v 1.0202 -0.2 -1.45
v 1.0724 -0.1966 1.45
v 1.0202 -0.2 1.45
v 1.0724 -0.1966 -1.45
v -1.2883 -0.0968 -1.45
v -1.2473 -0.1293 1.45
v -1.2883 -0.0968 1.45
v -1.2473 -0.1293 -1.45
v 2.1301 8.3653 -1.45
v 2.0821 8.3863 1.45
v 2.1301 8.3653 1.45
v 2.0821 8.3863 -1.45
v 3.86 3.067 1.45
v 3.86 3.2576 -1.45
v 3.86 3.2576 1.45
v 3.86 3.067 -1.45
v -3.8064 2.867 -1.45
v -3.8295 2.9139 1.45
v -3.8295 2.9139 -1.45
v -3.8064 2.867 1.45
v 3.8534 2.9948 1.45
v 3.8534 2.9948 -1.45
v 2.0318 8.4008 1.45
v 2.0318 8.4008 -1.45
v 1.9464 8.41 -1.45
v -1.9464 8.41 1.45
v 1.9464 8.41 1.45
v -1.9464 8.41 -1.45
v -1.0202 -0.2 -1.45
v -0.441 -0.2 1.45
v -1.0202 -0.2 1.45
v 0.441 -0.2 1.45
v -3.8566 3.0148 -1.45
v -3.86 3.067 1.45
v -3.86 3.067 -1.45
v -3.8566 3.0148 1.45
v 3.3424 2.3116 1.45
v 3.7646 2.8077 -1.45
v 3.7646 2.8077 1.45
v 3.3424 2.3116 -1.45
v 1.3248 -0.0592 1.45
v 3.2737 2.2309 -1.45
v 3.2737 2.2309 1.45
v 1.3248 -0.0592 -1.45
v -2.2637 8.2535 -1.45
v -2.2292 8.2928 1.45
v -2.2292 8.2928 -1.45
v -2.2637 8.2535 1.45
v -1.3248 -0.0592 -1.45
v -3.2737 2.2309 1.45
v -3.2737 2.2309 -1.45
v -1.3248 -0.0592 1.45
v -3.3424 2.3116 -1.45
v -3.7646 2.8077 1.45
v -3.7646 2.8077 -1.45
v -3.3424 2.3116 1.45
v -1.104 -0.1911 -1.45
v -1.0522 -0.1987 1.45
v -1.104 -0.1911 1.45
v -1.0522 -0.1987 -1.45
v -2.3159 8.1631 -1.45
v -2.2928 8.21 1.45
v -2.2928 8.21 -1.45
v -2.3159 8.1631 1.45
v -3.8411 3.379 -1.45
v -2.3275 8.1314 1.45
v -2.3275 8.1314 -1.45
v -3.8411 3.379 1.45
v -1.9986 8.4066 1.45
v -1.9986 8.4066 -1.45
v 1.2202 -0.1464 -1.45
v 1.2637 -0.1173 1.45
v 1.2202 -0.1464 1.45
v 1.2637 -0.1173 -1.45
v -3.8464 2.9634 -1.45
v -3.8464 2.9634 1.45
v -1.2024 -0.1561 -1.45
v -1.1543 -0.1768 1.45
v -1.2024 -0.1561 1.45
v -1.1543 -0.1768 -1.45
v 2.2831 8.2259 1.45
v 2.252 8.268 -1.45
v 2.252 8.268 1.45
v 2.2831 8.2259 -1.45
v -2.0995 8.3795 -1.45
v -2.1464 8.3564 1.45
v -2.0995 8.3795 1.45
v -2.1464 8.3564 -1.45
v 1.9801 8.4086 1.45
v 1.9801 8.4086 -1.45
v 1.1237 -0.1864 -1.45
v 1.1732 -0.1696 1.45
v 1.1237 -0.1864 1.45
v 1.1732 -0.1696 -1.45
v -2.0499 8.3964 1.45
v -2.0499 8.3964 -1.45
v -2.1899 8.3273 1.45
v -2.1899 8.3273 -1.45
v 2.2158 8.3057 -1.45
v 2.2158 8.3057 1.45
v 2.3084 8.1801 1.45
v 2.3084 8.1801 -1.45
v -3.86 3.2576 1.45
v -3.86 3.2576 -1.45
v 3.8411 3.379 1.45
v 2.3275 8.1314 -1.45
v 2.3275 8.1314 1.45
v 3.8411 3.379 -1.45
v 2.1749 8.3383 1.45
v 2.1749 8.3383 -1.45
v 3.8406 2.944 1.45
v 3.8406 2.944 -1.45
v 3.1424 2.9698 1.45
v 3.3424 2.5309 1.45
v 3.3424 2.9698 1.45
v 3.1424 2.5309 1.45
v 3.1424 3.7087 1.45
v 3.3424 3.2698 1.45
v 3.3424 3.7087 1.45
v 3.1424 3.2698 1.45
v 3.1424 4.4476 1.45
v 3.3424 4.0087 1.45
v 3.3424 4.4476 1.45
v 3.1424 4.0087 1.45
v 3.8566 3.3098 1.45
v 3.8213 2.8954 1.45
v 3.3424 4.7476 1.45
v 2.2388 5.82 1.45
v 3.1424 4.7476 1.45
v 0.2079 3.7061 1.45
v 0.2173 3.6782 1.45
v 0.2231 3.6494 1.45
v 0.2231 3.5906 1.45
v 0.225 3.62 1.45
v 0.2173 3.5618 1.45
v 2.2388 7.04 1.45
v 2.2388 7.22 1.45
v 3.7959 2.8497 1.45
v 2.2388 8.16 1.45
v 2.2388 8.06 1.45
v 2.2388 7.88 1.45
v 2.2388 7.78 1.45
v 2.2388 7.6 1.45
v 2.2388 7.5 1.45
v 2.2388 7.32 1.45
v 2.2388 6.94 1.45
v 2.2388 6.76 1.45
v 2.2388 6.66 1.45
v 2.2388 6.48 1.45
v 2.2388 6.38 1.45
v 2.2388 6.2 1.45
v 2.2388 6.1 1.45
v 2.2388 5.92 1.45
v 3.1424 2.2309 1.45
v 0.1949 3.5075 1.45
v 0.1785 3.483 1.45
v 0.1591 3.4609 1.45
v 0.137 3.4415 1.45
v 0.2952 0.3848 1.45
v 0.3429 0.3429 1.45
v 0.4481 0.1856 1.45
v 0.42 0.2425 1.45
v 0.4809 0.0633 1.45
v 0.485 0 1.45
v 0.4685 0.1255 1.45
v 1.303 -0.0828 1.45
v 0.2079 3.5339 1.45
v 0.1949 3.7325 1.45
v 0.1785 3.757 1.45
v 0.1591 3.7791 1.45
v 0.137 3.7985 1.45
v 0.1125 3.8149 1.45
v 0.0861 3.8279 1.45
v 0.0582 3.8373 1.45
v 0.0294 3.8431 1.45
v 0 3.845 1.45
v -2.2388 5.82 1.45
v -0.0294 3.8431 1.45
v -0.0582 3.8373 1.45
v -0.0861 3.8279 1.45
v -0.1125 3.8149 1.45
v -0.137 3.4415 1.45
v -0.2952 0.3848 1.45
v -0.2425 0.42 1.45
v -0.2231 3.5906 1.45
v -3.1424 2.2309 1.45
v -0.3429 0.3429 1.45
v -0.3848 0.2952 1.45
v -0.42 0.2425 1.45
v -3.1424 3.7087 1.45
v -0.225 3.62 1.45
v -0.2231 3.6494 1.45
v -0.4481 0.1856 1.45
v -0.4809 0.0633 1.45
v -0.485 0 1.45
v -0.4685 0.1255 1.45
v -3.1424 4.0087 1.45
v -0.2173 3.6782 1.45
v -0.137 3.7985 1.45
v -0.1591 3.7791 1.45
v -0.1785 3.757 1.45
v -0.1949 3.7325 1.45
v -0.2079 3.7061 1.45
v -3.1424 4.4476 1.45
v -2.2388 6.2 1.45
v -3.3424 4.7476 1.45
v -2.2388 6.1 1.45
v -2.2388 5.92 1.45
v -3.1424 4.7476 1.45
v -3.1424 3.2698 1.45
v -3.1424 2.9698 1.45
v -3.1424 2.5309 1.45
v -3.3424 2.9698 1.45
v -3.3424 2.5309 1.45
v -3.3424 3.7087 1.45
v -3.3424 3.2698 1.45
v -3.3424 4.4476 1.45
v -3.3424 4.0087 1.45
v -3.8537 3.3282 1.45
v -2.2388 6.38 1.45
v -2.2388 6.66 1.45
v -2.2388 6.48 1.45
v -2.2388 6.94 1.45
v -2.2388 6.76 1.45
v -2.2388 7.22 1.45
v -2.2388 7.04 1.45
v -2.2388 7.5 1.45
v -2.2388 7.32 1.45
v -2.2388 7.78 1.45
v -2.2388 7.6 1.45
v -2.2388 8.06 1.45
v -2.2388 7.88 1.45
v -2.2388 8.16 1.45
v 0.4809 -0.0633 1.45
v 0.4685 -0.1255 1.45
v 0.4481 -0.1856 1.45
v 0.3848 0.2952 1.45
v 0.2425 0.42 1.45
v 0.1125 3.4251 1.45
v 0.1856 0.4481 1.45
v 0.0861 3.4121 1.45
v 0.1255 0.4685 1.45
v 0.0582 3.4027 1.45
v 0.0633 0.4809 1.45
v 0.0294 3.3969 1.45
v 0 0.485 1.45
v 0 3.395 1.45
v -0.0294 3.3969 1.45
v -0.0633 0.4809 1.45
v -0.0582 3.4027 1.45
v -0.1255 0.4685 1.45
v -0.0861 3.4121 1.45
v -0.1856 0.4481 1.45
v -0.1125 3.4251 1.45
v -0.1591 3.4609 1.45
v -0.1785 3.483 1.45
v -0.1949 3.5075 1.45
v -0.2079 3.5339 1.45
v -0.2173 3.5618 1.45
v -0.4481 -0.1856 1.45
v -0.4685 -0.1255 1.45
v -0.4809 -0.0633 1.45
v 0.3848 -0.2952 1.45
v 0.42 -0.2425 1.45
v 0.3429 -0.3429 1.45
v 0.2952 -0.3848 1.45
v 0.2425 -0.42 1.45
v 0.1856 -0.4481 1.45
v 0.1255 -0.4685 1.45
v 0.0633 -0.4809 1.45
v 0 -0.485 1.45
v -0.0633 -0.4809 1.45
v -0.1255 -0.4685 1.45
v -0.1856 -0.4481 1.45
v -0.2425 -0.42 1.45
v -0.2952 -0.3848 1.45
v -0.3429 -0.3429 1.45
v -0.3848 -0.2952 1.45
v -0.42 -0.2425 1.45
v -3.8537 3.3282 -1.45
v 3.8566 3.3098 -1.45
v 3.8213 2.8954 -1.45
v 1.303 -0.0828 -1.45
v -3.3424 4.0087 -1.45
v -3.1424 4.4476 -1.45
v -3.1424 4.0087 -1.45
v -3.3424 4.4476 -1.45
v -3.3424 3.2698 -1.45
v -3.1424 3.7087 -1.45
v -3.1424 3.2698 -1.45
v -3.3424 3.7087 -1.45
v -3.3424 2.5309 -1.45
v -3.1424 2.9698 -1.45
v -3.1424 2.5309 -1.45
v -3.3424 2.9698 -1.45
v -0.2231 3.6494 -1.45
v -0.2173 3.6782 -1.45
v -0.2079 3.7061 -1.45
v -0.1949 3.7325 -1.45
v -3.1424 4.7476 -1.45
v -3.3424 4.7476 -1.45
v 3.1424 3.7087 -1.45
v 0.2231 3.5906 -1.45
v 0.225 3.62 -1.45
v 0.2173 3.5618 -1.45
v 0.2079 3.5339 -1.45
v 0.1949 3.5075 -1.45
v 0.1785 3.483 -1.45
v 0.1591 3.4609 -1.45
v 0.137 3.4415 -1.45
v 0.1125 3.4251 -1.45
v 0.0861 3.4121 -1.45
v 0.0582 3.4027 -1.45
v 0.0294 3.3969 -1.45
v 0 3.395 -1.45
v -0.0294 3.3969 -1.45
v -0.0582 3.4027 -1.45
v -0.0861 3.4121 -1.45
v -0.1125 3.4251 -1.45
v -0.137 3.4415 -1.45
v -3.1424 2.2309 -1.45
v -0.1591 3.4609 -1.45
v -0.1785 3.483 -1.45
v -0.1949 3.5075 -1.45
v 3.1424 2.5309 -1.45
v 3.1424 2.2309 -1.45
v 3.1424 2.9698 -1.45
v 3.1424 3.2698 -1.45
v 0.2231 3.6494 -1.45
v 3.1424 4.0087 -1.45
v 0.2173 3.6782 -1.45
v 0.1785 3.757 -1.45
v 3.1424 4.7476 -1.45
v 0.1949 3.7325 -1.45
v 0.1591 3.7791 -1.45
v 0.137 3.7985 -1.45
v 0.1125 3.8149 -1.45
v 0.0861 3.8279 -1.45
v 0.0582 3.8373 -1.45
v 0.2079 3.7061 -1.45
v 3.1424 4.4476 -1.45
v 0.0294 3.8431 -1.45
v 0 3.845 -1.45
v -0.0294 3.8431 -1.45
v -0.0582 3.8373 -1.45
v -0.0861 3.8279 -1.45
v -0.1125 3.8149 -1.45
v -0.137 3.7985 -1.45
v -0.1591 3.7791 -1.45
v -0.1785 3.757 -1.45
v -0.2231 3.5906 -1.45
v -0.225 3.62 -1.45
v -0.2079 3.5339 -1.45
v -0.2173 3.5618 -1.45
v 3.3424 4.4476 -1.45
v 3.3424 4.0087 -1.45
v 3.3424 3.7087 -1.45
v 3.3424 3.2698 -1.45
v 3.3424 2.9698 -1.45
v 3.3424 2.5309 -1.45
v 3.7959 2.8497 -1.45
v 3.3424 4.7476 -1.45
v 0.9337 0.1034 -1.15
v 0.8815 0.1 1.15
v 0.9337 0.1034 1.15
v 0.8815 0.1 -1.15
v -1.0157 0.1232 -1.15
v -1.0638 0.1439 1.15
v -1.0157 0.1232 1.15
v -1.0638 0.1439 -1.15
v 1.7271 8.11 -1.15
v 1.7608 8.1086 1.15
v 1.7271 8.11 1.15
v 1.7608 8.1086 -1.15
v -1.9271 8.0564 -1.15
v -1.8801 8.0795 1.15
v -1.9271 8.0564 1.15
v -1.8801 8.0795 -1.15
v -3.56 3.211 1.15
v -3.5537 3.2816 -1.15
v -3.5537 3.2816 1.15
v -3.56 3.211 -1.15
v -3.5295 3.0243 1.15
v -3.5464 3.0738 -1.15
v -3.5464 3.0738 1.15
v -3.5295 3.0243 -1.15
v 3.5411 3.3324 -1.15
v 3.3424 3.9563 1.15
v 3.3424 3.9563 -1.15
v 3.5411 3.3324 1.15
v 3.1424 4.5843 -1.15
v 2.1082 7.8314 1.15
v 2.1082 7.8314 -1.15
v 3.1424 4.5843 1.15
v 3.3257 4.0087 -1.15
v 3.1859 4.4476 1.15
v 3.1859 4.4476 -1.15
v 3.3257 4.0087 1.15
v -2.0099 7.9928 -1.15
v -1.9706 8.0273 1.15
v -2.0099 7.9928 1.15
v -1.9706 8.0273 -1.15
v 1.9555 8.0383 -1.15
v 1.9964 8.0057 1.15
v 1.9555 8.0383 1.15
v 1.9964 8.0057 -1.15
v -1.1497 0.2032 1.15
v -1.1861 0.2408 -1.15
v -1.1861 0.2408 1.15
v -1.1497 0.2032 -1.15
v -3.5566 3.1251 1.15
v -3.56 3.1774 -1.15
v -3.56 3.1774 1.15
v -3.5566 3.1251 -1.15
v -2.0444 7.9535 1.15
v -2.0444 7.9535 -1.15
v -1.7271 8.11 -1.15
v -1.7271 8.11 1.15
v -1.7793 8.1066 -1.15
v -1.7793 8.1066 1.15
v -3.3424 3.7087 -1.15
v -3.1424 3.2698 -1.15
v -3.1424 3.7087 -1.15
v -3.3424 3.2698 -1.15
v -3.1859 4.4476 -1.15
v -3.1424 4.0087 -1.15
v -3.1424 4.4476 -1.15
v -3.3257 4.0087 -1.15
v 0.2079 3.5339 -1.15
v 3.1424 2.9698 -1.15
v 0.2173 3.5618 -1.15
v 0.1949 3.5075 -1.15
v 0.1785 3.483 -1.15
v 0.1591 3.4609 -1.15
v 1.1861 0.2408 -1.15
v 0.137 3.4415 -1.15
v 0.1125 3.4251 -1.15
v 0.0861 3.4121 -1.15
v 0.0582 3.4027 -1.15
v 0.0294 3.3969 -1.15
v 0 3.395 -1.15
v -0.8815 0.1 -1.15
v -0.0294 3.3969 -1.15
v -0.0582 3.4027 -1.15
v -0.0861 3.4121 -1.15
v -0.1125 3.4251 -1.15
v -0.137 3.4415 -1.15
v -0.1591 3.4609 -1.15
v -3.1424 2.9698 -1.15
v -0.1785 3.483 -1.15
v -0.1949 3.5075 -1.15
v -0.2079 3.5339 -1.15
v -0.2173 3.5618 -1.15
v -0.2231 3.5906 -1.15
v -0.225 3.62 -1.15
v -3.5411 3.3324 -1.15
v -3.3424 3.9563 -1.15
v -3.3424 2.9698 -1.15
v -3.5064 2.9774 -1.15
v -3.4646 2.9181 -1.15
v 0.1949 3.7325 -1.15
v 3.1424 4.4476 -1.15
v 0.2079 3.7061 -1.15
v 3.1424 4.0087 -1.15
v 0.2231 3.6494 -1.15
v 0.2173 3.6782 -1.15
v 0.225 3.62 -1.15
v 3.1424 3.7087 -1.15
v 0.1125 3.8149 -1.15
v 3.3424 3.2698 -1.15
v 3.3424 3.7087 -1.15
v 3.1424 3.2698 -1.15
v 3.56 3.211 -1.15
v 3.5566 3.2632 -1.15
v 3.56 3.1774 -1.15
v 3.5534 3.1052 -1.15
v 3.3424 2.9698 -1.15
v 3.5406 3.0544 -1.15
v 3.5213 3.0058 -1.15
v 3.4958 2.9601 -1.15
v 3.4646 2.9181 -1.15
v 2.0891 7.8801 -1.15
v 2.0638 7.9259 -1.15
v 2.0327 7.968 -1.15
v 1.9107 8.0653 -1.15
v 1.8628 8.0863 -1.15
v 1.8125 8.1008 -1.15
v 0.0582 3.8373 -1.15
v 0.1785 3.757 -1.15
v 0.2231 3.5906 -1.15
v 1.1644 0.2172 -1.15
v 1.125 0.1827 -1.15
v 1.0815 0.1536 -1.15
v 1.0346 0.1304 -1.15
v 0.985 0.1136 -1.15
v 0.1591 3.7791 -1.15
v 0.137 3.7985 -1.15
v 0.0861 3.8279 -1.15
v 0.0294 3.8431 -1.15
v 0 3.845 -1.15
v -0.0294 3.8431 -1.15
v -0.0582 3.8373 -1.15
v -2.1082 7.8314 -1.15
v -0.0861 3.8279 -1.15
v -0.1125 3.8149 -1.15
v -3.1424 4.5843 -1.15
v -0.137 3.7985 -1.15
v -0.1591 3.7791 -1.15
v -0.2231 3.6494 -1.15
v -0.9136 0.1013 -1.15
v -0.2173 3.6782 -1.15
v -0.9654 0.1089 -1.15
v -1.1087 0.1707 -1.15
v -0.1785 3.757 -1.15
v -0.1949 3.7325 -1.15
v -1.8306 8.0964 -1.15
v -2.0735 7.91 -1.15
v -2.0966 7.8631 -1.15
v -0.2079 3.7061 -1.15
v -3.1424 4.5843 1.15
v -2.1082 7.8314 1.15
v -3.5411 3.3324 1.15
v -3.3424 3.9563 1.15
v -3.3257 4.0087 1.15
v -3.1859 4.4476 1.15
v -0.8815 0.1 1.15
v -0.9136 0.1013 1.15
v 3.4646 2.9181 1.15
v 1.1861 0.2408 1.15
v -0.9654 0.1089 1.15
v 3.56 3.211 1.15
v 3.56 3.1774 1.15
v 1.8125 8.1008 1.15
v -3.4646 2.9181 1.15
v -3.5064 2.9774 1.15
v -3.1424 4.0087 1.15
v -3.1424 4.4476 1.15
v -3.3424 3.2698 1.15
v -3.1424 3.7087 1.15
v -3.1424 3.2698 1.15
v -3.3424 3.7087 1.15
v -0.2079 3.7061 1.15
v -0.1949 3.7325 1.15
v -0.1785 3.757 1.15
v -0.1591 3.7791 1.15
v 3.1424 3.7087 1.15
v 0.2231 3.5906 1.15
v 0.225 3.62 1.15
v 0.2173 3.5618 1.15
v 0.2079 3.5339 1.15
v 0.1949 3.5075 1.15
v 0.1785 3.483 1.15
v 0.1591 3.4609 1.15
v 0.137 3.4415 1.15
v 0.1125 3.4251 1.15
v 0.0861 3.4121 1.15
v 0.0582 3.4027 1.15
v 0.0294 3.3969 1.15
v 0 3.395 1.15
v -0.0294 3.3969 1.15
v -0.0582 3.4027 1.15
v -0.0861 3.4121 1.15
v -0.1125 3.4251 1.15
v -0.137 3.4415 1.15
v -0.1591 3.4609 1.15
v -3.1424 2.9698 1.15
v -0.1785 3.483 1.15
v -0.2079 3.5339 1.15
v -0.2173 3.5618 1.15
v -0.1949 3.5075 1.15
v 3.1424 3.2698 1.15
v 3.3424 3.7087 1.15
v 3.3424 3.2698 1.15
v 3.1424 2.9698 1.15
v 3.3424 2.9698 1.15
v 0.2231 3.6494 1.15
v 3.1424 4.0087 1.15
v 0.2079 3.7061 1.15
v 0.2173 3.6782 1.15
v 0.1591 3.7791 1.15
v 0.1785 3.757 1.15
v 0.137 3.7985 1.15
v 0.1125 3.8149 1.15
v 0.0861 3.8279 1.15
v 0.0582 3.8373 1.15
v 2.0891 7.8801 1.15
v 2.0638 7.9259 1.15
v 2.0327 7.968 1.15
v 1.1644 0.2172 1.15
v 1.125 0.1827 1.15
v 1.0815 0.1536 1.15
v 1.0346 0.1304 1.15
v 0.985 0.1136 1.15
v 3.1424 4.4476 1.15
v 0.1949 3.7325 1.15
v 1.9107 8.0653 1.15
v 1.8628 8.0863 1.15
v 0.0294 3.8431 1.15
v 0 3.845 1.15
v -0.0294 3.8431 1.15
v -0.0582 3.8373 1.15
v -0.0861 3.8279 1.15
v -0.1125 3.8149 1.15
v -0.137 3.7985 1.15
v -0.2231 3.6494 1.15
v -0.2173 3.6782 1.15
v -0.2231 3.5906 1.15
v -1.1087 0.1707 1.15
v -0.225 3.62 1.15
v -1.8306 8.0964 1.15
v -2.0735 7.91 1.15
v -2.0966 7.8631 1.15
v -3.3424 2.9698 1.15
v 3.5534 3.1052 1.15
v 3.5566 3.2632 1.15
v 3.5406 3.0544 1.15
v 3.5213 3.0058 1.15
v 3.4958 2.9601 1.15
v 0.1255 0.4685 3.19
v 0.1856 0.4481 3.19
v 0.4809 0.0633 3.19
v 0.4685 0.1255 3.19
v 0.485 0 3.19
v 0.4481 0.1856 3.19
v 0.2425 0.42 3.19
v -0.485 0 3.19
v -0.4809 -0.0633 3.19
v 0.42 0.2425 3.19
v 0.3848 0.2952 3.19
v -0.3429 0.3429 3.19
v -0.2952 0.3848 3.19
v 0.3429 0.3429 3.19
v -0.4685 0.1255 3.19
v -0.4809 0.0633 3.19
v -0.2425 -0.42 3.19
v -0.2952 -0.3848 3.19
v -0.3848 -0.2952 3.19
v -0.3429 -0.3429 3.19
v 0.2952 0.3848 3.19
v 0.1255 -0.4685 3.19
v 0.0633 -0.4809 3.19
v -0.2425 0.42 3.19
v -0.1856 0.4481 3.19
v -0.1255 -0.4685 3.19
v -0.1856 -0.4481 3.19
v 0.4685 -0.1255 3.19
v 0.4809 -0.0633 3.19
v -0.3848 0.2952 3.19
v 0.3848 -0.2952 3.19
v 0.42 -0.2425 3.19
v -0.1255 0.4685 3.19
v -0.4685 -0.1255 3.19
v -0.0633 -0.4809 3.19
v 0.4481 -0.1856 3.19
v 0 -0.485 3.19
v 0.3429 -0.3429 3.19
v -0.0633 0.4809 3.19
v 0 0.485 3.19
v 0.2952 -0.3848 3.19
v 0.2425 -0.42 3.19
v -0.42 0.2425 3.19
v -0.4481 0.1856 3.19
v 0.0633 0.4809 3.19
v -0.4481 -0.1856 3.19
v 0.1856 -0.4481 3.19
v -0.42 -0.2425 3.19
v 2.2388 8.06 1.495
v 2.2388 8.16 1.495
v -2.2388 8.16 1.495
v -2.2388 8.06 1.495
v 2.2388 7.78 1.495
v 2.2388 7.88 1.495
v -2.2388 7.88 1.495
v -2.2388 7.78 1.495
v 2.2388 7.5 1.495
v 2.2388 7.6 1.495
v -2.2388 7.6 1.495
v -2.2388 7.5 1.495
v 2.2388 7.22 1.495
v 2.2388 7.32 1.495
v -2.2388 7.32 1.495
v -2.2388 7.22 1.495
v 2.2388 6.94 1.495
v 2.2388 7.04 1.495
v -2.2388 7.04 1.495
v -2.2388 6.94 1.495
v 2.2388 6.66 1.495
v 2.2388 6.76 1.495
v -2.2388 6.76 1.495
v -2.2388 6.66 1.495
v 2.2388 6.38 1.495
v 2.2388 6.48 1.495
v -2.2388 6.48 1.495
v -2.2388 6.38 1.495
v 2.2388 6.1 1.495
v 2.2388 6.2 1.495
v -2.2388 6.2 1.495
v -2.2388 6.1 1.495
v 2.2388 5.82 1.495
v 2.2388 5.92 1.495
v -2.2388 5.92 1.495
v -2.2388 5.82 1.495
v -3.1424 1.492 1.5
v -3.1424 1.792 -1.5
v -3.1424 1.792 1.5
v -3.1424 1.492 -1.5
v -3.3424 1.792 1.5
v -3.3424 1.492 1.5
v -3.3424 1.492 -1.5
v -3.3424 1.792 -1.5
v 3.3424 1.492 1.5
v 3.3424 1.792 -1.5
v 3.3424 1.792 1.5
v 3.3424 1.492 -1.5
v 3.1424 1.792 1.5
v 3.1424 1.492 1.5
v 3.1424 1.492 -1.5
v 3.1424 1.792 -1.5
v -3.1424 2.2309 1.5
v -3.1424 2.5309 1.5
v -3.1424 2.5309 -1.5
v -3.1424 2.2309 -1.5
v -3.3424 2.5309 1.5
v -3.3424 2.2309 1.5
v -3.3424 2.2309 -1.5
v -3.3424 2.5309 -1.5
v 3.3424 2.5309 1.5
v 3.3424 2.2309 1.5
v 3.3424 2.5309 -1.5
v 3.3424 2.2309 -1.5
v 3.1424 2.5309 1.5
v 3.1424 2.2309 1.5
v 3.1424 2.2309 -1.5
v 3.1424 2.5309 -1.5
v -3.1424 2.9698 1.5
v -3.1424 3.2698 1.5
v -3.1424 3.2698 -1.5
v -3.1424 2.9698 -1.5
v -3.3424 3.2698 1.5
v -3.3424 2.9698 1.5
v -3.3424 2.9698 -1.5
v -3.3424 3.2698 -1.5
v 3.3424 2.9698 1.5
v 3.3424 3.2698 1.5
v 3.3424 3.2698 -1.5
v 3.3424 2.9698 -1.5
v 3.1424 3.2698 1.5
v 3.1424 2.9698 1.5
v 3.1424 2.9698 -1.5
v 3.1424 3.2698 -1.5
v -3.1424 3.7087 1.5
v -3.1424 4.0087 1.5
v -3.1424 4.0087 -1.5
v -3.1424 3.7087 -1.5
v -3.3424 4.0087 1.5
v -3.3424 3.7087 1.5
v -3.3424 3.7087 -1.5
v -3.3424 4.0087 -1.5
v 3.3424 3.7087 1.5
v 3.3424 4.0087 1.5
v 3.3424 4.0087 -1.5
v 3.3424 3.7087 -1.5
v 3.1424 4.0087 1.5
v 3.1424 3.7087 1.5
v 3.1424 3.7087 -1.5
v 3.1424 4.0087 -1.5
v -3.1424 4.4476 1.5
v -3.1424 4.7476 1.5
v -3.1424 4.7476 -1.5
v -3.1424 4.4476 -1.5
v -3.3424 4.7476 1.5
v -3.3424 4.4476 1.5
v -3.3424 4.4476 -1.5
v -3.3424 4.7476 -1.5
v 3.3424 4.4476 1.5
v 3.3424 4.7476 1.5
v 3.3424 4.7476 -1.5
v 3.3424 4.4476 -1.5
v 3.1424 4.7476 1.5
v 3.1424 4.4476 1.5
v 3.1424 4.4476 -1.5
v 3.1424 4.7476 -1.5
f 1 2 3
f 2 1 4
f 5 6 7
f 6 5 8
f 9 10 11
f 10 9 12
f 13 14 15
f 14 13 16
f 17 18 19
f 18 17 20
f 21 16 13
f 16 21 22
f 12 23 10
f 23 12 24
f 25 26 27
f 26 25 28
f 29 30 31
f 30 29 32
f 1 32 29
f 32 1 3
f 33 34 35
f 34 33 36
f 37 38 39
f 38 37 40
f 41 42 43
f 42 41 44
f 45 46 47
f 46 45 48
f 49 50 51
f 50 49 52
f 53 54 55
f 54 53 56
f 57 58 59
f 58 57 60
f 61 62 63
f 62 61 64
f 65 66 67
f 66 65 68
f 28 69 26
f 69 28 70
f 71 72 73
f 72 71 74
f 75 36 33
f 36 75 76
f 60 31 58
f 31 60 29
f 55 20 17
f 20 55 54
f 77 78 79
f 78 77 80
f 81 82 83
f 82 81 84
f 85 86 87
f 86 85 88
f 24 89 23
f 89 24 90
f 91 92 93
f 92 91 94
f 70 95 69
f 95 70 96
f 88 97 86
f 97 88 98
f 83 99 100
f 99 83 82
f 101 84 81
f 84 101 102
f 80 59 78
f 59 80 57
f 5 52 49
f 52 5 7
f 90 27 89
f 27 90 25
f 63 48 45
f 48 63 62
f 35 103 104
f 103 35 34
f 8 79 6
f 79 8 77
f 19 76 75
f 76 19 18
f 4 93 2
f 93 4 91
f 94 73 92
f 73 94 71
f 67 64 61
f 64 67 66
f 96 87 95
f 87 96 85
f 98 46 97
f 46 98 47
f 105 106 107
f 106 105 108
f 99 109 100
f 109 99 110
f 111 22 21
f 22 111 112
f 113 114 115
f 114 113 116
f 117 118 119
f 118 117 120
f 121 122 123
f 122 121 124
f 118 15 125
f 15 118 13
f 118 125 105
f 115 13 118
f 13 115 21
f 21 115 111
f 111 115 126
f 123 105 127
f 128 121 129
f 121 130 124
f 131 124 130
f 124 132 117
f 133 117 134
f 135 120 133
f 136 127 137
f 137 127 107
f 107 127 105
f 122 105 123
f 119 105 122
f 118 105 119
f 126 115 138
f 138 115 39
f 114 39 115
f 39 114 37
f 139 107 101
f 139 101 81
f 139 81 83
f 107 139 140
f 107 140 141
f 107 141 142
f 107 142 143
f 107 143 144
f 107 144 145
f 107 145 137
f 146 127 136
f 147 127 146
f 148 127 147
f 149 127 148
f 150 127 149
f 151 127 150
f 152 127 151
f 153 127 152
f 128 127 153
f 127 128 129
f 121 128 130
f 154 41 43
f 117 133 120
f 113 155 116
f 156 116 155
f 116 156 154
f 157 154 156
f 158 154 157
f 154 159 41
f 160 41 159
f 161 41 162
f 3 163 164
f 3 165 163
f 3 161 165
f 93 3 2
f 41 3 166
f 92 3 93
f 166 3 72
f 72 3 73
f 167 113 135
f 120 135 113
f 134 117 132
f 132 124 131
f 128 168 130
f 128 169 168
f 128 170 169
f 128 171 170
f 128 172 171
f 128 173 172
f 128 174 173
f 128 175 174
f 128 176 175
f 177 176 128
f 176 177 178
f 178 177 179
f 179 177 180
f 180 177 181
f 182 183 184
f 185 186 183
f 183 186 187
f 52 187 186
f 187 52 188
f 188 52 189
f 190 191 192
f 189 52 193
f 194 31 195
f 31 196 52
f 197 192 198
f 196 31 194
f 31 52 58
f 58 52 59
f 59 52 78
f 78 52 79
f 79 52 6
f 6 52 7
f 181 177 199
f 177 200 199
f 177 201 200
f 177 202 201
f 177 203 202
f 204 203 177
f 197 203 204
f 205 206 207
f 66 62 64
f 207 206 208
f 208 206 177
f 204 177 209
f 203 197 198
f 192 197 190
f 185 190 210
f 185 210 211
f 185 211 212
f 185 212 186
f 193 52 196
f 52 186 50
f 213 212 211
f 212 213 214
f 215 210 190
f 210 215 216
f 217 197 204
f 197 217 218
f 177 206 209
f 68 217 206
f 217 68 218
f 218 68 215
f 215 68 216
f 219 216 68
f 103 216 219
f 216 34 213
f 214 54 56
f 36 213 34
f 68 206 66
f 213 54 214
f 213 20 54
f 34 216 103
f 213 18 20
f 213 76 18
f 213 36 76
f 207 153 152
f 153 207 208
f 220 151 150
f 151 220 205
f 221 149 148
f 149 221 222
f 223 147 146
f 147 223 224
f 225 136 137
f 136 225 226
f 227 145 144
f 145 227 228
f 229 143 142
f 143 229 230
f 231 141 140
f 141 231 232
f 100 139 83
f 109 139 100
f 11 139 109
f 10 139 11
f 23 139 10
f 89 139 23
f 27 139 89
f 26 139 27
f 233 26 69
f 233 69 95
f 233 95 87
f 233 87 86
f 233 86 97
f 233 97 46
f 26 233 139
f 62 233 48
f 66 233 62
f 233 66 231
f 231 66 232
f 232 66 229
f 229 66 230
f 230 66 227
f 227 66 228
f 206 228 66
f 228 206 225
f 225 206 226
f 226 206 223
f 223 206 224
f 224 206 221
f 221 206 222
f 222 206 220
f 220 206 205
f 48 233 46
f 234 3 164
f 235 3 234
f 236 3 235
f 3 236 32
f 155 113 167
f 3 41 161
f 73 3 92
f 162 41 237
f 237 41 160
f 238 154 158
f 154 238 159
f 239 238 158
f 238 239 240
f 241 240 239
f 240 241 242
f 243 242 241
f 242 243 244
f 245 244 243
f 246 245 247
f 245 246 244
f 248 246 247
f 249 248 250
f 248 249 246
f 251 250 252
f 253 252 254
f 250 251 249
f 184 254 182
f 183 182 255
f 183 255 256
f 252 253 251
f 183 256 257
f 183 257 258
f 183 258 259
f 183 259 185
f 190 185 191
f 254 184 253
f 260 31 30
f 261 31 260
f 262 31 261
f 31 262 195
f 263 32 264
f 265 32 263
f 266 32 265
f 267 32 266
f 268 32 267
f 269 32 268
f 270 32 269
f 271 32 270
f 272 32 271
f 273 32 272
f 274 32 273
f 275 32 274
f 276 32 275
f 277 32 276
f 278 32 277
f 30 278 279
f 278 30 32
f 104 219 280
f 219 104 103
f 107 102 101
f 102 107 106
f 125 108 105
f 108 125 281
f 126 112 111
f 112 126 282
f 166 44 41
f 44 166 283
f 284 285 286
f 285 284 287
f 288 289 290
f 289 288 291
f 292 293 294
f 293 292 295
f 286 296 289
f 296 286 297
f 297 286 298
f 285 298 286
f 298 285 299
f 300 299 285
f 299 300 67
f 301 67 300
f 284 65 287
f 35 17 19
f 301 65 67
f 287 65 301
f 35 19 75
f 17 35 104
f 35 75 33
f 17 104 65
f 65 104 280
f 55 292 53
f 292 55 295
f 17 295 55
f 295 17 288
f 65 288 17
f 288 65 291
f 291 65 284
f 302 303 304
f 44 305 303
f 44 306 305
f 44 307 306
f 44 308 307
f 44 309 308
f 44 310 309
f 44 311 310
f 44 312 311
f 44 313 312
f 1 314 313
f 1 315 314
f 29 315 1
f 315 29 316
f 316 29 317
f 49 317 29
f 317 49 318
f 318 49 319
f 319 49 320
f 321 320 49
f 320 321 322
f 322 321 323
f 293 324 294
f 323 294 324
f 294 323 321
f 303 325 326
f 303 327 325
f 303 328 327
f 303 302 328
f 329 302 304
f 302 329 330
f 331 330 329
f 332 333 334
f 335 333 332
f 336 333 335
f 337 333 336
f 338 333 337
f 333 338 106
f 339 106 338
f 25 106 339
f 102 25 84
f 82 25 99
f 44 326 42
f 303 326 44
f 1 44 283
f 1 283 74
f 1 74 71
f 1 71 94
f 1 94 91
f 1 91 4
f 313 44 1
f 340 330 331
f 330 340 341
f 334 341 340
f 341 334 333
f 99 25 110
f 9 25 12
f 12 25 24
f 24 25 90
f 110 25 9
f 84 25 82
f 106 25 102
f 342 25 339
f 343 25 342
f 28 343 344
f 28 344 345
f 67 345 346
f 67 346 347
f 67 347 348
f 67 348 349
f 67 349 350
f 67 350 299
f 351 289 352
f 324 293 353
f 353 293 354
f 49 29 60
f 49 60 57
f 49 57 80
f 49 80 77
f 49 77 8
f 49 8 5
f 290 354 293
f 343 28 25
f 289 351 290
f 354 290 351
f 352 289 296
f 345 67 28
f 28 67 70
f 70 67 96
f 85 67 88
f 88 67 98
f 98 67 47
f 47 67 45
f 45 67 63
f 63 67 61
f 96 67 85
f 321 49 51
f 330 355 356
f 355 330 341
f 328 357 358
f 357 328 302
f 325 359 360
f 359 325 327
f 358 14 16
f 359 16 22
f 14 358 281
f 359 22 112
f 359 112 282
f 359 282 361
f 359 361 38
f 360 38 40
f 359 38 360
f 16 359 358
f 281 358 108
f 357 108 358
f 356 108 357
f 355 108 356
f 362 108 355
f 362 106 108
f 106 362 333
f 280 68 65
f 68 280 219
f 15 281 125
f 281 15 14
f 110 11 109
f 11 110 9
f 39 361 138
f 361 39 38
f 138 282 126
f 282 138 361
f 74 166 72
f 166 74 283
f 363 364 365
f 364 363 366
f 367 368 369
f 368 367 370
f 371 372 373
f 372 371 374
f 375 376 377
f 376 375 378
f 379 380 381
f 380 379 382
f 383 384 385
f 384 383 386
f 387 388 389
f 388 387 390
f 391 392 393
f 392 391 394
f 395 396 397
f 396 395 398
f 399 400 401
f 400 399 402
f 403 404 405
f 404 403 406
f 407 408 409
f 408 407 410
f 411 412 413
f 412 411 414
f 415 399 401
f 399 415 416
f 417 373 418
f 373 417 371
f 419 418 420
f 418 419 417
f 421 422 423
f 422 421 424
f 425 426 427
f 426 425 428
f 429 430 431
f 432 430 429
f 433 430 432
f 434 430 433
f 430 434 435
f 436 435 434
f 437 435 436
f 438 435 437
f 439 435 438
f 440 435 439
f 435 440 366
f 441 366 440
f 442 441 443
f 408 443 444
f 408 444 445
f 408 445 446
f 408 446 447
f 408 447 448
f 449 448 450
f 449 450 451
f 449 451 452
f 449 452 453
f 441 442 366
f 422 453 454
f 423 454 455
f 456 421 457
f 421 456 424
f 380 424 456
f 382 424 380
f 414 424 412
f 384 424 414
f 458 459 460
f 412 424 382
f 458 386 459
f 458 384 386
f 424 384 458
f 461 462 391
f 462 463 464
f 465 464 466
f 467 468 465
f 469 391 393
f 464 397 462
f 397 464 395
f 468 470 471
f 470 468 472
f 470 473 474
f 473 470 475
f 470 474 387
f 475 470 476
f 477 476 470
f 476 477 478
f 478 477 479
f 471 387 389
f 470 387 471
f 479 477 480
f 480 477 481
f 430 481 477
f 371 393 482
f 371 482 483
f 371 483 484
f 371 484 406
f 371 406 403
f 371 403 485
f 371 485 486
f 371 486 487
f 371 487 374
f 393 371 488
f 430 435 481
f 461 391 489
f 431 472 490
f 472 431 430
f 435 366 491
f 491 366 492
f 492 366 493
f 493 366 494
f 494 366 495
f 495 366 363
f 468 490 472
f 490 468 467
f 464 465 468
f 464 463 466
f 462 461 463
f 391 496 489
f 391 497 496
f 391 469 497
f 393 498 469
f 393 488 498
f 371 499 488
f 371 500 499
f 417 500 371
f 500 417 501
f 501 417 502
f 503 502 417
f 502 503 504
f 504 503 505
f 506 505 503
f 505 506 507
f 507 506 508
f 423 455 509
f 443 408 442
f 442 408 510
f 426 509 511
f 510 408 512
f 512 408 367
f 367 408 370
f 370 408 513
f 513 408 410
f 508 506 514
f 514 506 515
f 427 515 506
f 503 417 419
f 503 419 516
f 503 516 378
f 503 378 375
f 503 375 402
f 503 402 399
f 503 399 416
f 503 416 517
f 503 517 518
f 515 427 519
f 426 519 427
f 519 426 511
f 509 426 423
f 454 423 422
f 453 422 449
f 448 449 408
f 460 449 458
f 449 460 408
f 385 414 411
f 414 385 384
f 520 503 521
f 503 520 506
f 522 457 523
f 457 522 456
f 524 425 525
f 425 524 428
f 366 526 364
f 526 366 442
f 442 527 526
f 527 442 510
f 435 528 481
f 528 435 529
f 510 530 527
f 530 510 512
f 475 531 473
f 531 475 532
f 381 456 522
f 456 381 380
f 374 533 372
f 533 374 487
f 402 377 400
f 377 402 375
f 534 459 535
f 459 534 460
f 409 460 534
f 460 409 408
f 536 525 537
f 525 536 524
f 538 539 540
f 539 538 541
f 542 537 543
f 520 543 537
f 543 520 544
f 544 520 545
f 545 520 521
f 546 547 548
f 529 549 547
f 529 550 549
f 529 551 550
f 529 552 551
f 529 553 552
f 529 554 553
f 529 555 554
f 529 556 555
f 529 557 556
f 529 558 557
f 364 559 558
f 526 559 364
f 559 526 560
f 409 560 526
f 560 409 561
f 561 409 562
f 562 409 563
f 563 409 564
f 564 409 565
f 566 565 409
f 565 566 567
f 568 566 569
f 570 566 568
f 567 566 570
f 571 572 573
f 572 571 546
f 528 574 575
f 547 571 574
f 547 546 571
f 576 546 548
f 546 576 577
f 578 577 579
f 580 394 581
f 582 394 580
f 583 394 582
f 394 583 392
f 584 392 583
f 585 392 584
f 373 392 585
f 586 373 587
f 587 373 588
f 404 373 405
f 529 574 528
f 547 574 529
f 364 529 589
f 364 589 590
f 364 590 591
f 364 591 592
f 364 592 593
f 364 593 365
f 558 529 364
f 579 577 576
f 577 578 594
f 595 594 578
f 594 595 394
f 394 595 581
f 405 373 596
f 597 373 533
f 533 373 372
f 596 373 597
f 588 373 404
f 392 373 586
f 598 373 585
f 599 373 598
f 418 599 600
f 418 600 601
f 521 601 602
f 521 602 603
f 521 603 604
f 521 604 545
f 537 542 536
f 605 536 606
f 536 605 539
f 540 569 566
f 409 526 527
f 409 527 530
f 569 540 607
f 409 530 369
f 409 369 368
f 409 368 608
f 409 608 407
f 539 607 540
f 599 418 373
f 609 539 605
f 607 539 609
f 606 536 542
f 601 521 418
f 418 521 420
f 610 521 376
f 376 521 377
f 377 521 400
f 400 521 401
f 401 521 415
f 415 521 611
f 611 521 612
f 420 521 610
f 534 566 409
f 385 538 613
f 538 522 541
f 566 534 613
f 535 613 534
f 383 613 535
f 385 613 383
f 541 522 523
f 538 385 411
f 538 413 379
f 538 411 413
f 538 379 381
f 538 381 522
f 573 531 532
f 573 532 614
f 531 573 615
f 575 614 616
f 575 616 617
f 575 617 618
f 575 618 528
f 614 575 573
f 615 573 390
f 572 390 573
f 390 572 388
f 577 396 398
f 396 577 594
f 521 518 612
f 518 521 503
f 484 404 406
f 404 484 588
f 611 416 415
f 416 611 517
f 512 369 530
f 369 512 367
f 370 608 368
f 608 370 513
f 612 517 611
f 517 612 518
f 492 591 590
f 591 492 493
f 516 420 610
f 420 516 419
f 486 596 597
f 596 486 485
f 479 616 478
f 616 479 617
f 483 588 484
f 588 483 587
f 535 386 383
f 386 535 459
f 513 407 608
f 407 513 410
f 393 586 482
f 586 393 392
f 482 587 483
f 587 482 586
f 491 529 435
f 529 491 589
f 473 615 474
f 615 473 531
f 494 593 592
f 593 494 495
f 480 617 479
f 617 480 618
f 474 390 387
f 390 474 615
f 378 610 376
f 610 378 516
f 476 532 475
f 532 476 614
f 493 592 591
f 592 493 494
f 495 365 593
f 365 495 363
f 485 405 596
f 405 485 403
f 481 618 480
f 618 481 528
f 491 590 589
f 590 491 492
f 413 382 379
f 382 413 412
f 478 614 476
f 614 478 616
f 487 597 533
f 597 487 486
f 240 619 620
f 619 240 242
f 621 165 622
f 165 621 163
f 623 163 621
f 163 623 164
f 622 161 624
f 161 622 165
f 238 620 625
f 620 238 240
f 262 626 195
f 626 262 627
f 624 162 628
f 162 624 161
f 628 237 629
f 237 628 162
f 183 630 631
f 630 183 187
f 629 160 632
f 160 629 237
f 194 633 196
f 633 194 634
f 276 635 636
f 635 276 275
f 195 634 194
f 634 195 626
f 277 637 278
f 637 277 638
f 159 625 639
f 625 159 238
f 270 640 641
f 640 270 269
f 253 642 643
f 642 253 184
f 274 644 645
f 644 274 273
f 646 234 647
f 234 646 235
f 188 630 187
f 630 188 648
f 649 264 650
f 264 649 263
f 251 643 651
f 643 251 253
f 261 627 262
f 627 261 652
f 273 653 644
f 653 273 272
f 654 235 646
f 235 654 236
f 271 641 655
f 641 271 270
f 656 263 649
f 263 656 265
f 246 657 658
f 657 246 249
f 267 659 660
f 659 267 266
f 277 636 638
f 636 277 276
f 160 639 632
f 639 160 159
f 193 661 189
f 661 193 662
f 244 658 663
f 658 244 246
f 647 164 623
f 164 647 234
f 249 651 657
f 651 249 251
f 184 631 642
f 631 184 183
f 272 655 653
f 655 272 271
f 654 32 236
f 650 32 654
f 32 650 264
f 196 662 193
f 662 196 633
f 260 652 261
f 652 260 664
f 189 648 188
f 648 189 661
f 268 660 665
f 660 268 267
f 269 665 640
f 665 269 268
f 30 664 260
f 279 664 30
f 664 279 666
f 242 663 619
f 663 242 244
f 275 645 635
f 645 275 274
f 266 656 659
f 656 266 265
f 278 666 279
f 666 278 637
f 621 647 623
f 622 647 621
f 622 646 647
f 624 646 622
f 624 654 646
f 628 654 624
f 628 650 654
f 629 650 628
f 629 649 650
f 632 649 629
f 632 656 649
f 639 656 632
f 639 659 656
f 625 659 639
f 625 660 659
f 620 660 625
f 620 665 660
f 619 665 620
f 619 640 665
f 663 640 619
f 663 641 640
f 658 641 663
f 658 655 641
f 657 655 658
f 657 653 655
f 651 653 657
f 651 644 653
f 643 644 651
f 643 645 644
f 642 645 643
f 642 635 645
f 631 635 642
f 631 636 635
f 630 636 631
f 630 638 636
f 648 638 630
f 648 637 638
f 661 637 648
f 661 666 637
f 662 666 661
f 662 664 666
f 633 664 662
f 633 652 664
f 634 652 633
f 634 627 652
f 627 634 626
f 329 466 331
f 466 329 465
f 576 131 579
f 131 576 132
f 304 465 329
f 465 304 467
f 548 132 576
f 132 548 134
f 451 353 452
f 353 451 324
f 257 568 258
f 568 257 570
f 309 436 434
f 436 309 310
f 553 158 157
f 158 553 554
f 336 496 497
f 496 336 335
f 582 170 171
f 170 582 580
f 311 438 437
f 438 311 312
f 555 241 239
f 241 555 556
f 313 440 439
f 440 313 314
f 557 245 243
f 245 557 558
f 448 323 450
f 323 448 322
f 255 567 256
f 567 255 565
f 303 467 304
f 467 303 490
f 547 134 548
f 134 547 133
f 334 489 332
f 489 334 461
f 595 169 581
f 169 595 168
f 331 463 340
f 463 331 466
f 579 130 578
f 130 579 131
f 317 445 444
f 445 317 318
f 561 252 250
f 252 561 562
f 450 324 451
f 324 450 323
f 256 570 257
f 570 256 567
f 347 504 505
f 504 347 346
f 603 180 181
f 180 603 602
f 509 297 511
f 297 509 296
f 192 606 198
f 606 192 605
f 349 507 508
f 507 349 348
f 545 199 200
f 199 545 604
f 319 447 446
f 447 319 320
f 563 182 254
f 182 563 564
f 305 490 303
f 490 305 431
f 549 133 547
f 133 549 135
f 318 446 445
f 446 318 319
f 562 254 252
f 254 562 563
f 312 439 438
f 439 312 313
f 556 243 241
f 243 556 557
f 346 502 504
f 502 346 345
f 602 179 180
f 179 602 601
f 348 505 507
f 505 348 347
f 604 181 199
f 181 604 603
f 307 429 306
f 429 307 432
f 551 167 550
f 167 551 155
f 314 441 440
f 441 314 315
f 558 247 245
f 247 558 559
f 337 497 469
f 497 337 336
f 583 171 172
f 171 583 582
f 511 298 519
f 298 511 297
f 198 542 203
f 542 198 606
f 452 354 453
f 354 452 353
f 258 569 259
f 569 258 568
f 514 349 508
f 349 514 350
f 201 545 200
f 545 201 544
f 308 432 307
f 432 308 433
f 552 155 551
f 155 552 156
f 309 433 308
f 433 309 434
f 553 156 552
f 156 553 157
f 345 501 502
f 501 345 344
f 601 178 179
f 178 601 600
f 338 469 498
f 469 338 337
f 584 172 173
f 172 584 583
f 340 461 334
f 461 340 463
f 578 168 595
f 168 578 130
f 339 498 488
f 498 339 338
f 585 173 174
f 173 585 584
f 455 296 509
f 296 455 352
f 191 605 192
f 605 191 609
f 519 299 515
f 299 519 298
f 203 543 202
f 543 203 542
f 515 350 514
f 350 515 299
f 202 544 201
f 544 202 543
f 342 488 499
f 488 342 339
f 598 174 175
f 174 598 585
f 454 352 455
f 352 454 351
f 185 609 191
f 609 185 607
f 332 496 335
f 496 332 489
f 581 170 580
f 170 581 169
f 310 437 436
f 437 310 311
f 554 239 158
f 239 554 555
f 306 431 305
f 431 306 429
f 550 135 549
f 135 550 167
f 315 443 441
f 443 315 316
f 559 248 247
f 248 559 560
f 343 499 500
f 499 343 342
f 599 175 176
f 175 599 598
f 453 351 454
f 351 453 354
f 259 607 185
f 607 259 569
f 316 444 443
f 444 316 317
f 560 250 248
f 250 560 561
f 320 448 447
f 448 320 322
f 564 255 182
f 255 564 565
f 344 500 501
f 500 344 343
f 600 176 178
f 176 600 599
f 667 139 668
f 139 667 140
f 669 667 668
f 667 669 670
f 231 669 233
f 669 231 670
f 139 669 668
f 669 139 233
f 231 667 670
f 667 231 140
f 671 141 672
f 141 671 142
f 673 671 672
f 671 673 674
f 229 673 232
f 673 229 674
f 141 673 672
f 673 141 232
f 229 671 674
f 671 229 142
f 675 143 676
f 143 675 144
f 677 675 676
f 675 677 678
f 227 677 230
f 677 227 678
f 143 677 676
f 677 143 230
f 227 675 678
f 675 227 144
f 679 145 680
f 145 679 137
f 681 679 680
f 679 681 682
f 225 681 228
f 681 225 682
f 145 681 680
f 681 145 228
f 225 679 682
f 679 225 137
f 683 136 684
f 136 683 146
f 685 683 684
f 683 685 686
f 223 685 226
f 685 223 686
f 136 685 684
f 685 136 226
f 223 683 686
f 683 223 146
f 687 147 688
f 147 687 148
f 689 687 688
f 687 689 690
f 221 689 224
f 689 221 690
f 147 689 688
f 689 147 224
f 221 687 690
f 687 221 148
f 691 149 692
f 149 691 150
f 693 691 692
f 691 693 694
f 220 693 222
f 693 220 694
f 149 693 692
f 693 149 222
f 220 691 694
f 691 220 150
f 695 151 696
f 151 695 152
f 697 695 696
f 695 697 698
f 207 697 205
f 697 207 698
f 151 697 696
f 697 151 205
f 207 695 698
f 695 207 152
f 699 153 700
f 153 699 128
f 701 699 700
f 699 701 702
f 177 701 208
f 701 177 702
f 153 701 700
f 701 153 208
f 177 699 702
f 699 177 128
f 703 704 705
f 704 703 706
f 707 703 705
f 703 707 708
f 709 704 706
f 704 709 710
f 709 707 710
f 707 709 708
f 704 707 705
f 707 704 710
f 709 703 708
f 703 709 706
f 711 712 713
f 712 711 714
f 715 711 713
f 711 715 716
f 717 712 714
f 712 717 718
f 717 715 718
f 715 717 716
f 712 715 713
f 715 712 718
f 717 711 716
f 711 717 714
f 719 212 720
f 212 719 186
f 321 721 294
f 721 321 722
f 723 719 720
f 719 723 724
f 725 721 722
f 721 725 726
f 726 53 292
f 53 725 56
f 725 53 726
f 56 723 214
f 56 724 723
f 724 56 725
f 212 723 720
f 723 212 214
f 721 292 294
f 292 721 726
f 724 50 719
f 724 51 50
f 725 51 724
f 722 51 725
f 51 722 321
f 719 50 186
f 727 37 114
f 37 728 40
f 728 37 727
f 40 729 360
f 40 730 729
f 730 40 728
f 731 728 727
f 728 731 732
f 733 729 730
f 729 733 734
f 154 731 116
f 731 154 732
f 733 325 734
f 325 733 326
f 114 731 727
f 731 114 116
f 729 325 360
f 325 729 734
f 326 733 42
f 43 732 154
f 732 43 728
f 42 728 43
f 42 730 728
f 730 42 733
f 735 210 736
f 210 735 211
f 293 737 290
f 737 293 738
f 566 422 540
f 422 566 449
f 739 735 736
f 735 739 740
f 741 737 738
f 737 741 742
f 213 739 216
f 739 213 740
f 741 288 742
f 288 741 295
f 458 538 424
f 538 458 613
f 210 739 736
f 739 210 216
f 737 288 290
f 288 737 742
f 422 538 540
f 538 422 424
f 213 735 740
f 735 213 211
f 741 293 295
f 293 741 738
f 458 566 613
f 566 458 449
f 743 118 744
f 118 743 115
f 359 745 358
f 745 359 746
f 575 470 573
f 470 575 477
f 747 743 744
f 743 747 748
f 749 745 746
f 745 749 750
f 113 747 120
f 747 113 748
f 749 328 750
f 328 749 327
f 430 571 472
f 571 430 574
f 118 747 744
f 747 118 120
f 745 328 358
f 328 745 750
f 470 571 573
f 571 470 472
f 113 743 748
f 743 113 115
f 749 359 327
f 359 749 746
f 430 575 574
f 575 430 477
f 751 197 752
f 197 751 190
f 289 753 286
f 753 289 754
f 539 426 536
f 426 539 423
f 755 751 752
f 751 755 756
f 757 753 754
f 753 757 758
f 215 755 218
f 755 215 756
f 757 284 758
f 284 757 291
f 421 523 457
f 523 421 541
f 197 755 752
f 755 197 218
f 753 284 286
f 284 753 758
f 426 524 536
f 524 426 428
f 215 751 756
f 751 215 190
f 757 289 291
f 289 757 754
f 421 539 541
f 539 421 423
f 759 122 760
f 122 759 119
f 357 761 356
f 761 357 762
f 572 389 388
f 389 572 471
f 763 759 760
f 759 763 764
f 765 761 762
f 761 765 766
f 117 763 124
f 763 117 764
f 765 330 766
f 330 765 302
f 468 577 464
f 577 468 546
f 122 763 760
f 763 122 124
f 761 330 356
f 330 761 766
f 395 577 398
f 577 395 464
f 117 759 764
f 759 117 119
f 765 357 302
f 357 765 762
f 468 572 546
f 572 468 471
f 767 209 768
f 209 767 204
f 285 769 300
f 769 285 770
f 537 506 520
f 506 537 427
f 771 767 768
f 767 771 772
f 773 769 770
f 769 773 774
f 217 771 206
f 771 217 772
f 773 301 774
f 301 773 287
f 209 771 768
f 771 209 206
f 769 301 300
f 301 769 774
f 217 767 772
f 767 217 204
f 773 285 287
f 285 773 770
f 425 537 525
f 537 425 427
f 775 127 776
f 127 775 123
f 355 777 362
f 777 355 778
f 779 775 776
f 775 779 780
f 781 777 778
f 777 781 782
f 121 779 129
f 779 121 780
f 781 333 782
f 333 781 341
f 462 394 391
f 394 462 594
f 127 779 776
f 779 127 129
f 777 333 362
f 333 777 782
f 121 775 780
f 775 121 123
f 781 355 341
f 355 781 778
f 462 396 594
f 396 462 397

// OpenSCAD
// =============================================
// Custom Chip Clip — Prototype v1
// Track-mount design with cylinder posts
// =============================================
// PRINT 2 COPIES — assemble with a spring pin
// All dimensions in cm
//
// Measurements:
//   Clip total height:   8.5cm
//   Body width (max):    8.0cm
//   Handle width:        2.5cm
//   Arm depth:           3.0cm
//   Cylinder diameter:   1.0cm
//   Cylinder length:     1.8cm (estimated — adjust to match your track)
//   Pivot from bottom:   4.75cm
// =============================================

$fn = 48;

// === DIMENSIONS (cm) — scaled down 3.45% from OXO reference ===
CH    = 8.21;  // clip height, handle top to grip tip
BW    = 7.72;  // max body width
HW    = 2.41;  // handle width
AD    = 2.90;  // arm depth (front to back)
WT    = 0.3;   // wall thickness (hollow shell)

CYL_D = 0.97;  // cylinder diameter
CYL_L = 1.74;  // cylinder length (how far it inserts into track)
PIN_D = 0.45;  // spring pin hole diameter
PIN_Y = CH - 4.59;  // pivot location — 4.59cm from bottom tip (scaled)

// Grip serrations at tip
N_SERR     = 9;
SERR_PITCH = 0.28;

// Spine ridges (structural + aesthetic)
N_SPINE    = 5;

// === 2D ARM PROFILE (viewed from front) ===
module arm_2d() {
    hull() {
        square([HW,   0.4], center=true);                         // narrow top
        translate([0, CH*0.38]) square([BW,   0.4], center=true); // wide middle
        translate([0, CH])      square([BW*0.58, 0.4], center=true); // tapered tip
    }
}

// === SINGLE ARM ===
module arm() {
    difference() {
        union() {
            // Main hollow arm body
            difference() {
                // Outer shell
                linear_extrude(AD, center=true)
                    offset(r=0.4) offset(r=-0.4)
                    arm_2d();
                
                // Hollow interior
                translate([0, 0, 0])
                    linear_extrude(AD - WT*2, center=true)
                    offset(r=0.4) offset(r=-0.4)
                    offset(delta=-WT)
                    arm_2d();
            }
            
            // === TRACK MOUNT CYLINDER ===
            // Sits on top of handle, points upward
            // Slides into matching hole in underside track
            translate([0, 0, AD/2])
                cylinder(d=CYL_D, h=CYL_L);
        }
        
        // Spring pivot pin hole
        translate([0, PIN_Y, 0])
            cylinder(d=PIN_D, h=AD+0.2, center=true);
    }
    
    // === GRIP SERRATIONS (at tip) ===
    for(i = [0 : N_SERR-1]) {
        translate([0, CH - i*SERR_PITCH - 0.1, AD/2])
            cube([BW*0.58, 0.1, 0.09], center=true);
    }
    
    // === SPINE RIDGES (outer edge, structural) ===
    for(i = [0 : N_SPINE-1]) {
        ry = CH*0.2 + i*(CH*0.45/N_SPINE);
        for(side=[-1,1]) {
            translate([side*(BW*0.42), ry, 0])
                cube([0.2, 0.3, AD+0.1], center=true);
        }
    }
}

// === RENDER ===
// Renders ONE arm — print 2 copies
arm();

// --- PREVIEW ASSEMBLY ---
// Uncomment the lines below to preview both arms together:
// arm();
// translate([0, 0, AD + 0.15]) mirror([0,0,1]) arm();
